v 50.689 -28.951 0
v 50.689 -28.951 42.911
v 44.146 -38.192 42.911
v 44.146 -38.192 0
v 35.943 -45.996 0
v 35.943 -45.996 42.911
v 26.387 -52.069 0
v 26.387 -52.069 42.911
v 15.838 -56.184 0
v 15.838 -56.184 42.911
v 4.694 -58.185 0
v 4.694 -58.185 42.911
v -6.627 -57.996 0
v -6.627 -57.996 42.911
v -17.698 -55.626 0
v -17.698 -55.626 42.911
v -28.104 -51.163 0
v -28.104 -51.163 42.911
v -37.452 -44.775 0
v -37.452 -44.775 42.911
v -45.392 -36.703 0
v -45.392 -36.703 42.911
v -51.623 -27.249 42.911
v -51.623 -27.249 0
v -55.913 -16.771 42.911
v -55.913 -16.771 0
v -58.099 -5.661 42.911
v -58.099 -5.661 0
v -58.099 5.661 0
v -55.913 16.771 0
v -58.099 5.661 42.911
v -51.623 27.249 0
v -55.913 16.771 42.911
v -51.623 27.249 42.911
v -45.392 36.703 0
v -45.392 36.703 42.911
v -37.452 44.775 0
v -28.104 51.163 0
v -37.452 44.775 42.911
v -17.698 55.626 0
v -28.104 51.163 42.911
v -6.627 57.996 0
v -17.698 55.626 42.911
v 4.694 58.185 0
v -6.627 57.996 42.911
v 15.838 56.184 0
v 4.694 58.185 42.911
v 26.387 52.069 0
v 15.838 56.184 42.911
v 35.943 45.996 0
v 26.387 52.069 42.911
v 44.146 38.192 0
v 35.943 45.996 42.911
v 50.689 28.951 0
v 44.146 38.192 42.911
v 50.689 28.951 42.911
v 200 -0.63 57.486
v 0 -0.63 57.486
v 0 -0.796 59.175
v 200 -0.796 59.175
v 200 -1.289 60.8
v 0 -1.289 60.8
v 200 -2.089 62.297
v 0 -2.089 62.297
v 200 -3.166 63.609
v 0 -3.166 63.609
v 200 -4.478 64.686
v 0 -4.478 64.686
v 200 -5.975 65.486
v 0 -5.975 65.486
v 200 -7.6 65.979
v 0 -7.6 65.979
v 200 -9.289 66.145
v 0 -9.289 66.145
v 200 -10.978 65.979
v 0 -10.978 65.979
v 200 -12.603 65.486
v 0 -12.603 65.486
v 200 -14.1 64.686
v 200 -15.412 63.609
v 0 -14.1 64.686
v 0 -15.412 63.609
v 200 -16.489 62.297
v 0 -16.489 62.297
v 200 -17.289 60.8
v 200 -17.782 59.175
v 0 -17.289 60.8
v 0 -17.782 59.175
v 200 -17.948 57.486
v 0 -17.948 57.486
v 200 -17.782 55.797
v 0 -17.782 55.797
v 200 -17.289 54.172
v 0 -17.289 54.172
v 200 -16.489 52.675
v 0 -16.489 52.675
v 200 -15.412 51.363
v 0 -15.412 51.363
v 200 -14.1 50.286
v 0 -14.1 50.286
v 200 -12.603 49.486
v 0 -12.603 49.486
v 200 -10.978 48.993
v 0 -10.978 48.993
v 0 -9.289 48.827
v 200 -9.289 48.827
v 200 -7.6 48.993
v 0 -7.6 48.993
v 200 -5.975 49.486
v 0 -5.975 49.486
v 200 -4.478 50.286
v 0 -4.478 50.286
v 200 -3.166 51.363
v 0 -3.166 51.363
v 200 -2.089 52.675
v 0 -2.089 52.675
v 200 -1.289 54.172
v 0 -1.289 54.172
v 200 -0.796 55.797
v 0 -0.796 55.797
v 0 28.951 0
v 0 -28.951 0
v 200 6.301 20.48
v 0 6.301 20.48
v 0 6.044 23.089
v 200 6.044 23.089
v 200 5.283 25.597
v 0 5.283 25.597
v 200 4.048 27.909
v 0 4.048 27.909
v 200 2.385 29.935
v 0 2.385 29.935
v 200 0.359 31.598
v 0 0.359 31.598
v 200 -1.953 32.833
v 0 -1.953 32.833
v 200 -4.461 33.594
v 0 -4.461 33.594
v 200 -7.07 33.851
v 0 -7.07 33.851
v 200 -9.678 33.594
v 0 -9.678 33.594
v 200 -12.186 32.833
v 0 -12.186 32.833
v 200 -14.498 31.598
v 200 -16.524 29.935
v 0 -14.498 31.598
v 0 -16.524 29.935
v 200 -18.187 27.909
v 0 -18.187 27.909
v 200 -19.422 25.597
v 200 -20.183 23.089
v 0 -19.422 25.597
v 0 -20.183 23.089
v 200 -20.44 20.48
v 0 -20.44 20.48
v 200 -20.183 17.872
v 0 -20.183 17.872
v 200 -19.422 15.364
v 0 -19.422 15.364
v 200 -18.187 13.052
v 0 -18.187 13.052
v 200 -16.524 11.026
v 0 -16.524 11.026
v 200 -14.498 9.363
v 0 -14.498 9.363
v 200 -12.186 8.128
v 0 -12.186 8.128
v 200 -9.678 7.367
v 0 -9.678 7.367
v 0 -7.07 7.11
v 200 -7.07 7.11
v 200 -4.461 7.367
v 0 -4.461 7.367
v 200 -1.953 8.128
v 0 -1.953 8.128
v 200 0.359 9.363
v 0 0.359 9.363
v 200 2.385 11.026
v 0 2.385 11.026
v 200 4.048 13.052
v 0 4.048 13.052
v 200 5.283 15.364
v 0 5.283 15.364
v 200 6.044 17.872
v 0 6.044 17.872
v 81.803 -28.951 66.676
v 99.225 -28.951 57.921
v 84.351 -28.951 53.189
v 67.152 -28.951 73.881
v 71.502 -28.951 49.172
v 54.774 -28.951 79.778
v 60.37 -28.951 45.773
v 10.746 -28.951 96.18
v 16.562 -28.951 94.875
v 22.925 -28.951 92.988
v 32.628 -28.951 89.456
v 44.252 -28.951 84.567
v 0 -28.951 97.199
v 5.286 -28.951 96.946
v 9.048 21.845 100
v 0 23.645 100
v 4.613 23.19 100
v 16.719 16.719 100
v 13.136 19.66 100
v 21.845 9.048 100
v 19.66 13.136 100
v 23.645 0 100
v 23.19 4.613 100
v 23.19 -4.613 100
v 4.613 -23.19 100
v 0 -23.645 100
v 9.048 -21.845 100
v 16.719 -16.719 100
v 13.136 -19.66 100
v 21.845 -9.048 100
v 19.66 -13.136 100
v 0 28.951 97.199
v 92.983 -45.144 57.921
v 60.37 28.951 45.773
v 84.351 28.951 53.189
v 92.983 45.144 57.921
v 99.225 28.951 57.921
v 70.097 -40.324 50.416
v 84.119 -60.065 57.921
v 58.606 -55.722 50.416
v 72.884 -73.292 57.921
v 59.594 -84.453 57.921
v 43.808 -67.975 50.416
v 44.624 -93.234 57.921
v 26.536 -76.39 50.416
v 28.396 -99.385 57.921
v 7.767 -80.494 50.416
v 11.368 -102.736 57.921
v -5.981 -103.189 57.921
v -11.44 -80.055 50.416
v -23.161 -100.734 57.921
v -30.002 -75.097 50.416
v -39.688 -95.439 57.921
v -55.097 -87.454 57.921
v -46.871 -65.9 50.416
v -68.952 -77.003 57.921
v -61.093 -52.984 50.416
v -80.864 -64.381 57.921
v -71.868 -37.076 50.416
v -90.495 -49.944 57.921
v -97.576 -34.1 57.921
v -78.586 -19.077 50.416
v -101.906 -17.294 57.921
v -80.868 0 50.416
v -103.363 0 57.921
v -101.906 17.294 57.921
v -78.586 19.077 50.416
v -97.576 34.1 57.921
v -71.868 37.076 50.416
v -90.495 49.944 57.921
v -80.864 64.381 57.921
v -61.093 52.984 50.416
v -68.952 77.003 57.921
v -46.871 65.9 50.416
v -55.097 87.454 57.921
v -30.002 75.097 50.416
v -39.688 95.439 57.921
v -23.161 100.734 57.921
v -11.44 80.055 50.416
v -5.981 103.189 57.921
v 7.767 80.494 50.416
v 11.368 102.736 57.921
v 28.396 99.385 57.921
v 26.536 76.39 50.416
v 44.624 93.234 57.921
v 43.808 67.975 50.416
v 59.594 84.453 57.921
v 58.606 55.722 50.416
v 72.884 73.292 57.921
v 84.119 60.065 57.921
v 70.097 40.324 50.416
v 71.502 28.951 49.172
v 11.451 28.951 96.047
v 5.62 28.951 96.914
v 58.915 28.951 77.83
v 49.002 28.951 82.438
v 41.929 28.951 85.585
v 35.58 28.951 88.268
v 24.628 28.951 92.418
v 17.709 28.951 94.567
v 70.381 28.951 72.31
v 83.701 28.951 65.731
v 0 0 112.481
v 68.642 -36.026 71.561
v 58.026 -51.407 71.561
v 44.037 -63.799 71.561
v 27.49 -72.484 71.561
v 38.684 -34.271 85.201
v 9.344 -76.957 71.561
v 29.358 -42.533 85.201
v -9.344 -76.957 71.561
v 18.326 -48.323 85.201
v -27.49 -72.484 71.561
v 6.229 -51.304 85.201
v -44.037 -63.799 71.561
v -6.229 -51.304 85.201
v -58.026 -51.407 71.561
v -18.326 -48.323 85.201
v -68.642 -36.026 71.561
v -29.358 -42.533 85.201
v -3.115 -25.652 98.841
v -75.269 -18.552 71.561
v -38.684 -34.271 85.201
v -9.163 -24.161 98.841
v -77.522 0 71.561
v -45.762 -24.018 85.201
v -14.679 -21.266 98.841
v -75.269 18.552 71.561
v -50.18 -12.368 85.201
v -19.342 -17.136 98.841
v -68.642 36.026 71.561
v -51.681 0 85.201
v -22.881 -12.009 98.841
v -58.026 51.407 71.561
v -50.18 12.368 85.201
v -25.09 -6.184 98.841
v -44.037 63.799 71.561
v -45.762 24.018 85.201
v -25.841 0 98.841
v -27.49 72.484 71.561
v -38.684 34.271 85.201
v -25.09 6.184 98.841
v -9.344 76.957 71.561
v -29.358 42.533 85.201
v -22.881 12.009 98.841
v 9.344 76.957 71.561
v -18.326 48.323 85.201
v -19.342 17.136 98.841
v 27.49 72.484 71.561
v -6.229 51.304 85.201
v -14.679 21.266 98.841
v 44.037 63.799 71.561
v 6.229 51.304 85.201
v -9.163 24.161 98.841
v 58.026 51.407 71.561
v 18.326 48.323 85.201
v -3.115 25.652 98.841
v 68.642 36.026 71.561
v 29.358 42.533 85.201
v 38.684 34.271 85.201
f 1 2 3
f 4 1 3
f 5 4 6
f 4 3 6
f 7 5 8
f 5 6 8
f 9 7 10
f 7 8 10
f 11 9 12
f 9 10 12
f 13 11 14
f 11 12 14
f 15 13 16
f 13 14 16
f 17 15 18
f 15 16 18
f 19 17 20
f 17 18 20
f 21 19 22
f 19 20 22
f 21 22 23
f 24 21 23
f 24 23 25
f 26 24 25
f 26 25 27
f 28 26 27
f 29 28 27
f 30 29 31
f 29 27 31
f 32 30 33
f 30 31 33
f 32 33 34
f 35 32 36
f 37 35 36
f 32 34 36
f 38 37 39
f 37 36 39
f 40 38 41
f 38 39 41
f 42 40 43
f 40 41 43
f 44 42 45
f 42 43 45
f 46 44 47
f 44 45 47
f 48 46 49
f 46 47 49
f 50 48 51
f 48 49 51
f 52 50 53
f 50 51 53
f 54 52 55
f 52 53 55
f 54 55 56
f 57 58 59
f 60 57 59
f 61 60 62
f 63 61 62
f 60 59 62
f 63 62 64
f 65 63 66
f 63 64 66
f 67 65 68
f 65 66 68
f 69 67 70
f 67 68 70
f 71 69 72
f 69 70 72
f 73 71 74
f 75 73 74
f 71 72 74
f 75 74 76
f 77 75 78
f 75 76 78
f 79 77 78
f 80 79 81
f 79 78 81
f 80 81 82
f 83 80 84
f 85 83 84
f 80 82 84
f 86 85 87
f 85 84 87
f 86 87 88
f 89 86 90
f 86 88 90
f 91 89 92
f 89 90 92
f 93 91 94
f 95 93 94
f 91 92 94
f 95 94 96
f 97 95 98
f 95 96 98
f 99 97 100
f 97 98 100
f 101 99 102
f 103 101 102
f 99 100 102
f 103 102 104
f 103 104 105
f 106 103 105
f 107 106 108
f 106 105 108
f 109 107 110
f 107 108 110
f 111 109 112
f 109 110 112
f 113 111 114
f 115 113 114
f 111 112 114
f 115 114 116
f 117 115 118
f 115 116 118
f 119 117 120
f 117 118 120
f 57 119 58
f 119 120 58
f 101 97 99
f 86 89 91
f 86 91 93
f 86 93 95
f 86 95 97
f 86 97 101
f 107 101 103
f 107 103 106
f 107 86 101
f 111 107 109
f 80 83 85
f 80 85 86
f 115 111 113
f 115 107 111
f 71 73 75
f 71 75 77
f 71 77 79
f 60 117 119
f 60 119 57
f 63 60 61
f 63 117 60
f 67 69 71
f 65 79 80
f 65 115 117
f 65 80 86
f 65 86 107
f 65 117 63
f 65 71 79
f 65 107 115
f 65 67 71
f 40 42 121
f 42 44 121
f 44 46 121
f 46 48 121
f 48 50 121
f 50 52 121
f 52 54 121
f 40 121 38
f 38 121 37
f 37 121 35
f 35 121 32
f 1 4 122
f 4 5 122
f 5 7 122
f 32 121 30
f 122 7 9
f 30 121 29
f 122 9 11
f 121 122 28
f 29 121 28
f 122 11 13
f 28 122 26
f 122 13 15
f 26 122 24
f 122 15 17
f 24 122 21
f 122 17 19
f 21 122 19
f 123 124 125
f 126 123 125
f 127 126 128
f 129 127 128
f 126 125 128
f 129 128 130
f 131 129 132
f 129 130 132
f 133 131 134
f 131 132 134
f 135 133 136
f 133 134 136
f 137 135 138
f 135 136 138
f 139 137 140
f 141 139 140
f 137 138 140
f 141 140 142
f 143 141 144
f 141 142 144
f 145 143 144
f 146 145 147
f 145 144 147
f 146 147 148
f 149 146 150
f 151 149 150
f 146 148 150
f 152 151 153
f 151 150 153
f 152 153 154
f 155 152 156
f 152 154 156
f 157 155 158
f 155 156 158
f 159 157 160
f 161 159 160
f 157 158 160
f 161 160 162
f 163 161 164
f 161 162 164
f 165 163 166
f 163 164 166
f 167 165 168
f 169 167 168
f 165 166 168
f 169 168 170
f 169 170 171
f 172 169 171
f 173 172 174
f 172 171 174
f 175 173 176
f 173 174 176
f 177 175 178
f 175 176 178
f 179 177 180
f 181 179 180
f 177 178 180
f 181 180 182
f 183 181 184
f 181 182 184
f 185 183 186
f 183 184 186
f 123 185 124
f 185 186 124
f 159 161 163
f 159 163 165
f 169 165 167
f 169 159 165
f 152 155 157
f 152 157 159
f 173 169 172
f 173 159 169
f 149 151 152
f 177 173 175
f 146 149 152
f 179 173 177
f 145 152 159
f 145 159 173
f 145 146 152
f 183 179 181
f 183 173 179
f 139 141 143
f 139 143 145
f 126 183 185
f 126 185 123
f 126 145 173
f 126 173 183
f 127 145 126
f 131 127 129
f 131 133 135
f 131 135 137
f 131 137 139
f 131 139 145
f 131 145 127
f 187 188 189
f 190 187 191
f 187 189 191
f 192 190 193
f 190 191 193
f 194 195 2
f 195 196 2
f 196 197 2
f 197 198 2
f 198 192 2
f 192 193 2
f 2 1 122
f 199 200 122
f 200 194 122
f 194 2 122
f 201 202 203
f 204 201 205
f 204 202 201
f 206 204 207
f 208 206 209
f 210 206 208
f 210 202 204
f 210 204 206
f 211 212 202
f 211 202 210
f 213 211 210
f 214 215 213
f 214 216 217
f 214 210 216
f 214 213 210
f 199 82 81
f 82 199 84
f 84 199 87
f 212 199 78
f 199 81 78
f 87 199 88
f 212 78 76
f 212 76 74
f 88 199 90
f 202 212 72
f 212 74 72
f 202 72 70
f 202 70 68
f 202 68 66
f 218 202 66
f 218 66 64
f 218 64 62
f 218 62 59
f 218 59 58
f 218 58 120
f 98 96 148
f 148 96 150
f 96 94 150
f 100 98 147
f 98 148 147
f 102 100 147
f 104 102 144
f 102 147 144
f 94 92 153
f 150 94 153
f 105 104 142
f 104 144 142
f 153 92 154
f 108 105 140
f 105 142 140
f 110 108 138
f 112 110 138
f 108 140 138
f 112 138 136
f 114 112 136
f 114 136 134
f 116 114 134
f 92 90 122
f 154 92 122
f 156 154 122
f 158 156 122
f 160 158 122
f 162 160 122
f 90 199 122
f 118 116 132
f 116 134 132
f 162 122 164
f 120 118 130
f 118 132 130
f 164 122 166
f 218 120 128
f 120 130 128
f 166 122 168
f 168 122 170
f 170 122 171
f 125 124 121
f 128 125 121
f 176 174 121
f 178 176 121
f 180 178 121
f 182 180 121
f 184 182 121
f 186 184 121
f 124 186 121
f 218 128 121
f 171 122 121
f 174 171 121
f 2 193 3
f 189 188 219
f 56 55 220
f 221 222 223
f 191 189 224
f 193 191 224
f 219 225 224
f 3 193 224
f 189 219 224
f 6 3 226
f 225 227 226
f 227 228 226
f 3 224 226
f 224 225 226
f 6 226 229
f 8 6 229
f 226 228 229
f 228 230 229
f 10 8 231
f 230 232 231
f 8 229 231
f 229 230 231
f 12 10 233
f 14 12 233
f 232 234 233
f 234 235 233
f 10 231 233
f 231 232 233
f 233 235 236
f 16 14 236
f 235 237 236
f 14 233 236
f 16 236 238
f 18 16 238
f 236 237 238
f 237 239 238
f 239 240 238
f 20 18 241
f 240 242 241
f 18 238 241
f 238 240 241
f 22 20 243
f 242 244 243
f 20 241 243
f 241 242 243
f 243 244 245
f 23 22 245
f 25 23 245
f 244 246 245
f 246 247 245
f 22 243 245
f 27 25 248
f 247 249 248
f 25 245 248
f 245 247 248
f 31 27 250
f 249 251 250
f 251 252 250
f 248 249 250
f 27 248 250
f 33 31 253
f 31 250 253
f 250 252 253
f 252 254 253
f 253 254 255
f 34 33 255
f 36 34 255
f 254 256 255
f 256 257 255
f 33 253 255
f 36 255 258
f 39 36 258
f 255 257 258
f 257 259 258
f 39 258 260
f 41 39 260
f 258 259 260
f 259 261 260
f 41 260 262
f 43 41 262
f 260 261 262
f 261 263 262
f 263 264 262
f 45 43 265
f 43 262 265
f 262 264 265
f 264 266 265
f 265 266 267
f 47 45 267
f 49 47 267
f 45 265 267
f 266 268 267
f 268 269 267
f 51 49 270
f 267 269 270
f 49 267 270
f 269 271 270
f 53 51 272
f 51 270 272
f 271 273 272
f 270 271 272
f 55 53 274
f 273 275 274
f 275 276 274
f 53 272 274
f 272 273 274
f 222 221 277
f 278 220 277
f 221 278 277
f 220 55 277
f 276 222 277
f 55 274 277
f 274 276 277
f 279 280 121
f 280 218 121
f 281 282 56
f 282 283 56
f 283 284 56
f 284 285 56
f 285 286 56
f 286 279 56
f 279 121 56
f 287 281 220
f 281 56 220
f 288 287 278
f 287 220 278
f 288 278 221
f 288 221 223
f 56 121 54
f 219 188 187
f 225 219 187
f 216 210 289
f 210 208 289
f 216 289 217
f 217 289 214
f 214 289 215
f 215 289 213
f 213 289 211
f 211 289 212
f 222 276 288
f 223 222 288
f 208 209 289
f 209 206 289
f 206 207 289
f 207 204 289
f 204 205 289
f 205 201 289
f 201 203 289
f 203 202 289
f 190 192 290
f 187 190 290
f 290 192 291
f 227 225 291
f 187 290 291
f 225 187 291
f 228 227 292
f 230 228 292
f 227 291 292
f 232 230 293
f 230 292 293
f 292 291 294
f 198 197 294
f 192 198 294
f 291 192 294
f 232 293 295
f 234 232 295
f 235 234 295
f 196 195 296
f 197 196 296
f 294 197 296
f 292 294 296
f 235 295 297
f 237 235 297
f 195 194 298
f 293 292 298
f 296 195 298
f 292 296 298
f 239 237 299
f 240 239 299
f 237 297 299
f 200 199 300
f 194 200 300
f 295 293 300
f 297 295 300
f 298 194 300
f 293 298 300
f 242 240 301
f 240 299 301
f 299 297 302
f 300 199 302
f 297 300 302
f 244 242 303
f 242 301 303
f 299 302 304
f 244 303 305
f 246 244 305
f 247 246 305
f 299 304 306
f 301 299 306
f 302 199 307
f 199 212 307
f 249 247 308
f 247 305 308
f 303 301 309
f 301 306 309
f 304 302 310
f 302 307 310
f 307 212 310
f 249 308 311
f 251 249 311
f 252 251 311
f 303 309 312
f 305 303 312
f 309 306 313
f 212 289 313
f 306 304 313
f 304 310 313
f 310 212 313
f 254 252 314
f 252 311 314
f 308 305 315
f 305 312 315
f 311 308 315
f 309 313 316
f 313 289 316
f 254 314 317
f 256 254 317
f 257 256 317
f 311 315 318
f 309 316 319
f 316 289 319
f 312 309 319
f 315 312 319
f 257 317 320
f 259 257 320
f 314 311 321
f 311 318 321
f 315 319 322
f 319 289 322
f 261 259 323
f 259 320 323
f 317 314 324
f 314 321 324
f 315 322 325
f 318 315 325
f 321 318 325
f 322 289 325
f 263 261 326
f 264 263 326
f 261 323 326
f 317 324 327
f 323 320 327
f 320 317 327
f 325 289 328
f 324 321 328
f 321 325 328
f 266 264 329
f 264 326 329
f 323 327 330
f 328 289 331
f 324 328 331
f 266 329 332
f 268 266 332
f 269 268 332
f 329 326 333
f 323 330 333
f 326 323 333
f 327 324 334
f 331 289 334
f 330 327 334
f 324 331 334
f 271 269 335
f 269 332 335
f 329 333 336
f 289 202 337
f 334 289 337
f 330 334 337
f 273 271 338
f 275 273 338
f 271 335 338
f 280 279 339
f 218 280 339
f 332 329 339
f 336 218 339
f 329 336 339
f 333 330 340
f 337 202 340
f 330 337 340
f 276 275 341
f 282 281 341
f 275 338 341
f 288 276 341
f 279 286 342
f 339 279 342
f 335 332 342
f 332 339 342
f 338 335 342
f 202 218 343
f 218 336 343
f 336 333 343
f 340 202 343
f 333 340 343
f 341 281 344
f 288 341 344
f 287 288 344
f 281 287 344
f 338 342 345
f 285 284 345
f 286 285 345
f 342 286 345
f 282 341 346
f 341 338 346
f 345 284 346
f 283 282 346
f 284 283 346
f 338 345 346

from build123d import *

# Parameters (mm, degrees)
F3_DEPTH = 100
F4_R     = 8.65938
F4_R_2   = 13.370559
F5_DEPTH = 200


with BuildPart() as f1:
    # F0 (on Front) → F1 (revolve)
    with BuildSketch(Plane.XZ):
        Polygon((0, 112.481035), (0, 0), (58.373801, 0), (58.373801, 42.910885), (103.36262, 57.920542), align=None)
    revolve(axis=Axis((0, 0, 56.240518), (0, 0, -1)))

    # F2 (on face) → F3 (cut)
    with BuildSketch(Plane(origin=(0, 0, 0), x_dir=(1, 0, 0), z_dir=(0, 0, -1))):
        with BuildLine():
            Line((0, 28.951159), (0, -28.951159))
            Line((0, -28.951159), (50.68857, -28.951159))
            ThreePointArc((50.68857, -28.951159), (56.419789, -14.976919), (58.373801, 0))
            ThreePointArc((58.373801, 0), (56.419789, 14.976919), (50.68857, 28.951159))
            Line((50.68857, 28.951159), (0, 28.951159))
        make_face()
        with BuildLine():
            ThreePointArc((58.373801, 0), (56.419789, -14.976919), (50.68857, -28.951159))
            Line((50.68857, -28.951159), (267.143011, -28.951159))
            Line((267.143011, -28.951159), (267.143011, 28.951159))
            Line((267.143011, 28.951159), (50.68857, 28.951159))
            ThreePointArc((50.68857, 28.951159), (56.419789, 14.976919), (58.373801, 0))
        make_face()
    extrude(amount=-F3_DEPTH, mode=Mode.SUBTRACT)

    # F4 (on face) → F5 (join)
    with BuildSketch(Plane.YZ):
        with Locations((-9.289023, 57.48608)):
            Circle(F4_R)
        with Locations((-7.069625, 20.480426)):
            Circle(F4_R_2)
    extrude(amount=F5_DEPTH)


solid = f1.part
